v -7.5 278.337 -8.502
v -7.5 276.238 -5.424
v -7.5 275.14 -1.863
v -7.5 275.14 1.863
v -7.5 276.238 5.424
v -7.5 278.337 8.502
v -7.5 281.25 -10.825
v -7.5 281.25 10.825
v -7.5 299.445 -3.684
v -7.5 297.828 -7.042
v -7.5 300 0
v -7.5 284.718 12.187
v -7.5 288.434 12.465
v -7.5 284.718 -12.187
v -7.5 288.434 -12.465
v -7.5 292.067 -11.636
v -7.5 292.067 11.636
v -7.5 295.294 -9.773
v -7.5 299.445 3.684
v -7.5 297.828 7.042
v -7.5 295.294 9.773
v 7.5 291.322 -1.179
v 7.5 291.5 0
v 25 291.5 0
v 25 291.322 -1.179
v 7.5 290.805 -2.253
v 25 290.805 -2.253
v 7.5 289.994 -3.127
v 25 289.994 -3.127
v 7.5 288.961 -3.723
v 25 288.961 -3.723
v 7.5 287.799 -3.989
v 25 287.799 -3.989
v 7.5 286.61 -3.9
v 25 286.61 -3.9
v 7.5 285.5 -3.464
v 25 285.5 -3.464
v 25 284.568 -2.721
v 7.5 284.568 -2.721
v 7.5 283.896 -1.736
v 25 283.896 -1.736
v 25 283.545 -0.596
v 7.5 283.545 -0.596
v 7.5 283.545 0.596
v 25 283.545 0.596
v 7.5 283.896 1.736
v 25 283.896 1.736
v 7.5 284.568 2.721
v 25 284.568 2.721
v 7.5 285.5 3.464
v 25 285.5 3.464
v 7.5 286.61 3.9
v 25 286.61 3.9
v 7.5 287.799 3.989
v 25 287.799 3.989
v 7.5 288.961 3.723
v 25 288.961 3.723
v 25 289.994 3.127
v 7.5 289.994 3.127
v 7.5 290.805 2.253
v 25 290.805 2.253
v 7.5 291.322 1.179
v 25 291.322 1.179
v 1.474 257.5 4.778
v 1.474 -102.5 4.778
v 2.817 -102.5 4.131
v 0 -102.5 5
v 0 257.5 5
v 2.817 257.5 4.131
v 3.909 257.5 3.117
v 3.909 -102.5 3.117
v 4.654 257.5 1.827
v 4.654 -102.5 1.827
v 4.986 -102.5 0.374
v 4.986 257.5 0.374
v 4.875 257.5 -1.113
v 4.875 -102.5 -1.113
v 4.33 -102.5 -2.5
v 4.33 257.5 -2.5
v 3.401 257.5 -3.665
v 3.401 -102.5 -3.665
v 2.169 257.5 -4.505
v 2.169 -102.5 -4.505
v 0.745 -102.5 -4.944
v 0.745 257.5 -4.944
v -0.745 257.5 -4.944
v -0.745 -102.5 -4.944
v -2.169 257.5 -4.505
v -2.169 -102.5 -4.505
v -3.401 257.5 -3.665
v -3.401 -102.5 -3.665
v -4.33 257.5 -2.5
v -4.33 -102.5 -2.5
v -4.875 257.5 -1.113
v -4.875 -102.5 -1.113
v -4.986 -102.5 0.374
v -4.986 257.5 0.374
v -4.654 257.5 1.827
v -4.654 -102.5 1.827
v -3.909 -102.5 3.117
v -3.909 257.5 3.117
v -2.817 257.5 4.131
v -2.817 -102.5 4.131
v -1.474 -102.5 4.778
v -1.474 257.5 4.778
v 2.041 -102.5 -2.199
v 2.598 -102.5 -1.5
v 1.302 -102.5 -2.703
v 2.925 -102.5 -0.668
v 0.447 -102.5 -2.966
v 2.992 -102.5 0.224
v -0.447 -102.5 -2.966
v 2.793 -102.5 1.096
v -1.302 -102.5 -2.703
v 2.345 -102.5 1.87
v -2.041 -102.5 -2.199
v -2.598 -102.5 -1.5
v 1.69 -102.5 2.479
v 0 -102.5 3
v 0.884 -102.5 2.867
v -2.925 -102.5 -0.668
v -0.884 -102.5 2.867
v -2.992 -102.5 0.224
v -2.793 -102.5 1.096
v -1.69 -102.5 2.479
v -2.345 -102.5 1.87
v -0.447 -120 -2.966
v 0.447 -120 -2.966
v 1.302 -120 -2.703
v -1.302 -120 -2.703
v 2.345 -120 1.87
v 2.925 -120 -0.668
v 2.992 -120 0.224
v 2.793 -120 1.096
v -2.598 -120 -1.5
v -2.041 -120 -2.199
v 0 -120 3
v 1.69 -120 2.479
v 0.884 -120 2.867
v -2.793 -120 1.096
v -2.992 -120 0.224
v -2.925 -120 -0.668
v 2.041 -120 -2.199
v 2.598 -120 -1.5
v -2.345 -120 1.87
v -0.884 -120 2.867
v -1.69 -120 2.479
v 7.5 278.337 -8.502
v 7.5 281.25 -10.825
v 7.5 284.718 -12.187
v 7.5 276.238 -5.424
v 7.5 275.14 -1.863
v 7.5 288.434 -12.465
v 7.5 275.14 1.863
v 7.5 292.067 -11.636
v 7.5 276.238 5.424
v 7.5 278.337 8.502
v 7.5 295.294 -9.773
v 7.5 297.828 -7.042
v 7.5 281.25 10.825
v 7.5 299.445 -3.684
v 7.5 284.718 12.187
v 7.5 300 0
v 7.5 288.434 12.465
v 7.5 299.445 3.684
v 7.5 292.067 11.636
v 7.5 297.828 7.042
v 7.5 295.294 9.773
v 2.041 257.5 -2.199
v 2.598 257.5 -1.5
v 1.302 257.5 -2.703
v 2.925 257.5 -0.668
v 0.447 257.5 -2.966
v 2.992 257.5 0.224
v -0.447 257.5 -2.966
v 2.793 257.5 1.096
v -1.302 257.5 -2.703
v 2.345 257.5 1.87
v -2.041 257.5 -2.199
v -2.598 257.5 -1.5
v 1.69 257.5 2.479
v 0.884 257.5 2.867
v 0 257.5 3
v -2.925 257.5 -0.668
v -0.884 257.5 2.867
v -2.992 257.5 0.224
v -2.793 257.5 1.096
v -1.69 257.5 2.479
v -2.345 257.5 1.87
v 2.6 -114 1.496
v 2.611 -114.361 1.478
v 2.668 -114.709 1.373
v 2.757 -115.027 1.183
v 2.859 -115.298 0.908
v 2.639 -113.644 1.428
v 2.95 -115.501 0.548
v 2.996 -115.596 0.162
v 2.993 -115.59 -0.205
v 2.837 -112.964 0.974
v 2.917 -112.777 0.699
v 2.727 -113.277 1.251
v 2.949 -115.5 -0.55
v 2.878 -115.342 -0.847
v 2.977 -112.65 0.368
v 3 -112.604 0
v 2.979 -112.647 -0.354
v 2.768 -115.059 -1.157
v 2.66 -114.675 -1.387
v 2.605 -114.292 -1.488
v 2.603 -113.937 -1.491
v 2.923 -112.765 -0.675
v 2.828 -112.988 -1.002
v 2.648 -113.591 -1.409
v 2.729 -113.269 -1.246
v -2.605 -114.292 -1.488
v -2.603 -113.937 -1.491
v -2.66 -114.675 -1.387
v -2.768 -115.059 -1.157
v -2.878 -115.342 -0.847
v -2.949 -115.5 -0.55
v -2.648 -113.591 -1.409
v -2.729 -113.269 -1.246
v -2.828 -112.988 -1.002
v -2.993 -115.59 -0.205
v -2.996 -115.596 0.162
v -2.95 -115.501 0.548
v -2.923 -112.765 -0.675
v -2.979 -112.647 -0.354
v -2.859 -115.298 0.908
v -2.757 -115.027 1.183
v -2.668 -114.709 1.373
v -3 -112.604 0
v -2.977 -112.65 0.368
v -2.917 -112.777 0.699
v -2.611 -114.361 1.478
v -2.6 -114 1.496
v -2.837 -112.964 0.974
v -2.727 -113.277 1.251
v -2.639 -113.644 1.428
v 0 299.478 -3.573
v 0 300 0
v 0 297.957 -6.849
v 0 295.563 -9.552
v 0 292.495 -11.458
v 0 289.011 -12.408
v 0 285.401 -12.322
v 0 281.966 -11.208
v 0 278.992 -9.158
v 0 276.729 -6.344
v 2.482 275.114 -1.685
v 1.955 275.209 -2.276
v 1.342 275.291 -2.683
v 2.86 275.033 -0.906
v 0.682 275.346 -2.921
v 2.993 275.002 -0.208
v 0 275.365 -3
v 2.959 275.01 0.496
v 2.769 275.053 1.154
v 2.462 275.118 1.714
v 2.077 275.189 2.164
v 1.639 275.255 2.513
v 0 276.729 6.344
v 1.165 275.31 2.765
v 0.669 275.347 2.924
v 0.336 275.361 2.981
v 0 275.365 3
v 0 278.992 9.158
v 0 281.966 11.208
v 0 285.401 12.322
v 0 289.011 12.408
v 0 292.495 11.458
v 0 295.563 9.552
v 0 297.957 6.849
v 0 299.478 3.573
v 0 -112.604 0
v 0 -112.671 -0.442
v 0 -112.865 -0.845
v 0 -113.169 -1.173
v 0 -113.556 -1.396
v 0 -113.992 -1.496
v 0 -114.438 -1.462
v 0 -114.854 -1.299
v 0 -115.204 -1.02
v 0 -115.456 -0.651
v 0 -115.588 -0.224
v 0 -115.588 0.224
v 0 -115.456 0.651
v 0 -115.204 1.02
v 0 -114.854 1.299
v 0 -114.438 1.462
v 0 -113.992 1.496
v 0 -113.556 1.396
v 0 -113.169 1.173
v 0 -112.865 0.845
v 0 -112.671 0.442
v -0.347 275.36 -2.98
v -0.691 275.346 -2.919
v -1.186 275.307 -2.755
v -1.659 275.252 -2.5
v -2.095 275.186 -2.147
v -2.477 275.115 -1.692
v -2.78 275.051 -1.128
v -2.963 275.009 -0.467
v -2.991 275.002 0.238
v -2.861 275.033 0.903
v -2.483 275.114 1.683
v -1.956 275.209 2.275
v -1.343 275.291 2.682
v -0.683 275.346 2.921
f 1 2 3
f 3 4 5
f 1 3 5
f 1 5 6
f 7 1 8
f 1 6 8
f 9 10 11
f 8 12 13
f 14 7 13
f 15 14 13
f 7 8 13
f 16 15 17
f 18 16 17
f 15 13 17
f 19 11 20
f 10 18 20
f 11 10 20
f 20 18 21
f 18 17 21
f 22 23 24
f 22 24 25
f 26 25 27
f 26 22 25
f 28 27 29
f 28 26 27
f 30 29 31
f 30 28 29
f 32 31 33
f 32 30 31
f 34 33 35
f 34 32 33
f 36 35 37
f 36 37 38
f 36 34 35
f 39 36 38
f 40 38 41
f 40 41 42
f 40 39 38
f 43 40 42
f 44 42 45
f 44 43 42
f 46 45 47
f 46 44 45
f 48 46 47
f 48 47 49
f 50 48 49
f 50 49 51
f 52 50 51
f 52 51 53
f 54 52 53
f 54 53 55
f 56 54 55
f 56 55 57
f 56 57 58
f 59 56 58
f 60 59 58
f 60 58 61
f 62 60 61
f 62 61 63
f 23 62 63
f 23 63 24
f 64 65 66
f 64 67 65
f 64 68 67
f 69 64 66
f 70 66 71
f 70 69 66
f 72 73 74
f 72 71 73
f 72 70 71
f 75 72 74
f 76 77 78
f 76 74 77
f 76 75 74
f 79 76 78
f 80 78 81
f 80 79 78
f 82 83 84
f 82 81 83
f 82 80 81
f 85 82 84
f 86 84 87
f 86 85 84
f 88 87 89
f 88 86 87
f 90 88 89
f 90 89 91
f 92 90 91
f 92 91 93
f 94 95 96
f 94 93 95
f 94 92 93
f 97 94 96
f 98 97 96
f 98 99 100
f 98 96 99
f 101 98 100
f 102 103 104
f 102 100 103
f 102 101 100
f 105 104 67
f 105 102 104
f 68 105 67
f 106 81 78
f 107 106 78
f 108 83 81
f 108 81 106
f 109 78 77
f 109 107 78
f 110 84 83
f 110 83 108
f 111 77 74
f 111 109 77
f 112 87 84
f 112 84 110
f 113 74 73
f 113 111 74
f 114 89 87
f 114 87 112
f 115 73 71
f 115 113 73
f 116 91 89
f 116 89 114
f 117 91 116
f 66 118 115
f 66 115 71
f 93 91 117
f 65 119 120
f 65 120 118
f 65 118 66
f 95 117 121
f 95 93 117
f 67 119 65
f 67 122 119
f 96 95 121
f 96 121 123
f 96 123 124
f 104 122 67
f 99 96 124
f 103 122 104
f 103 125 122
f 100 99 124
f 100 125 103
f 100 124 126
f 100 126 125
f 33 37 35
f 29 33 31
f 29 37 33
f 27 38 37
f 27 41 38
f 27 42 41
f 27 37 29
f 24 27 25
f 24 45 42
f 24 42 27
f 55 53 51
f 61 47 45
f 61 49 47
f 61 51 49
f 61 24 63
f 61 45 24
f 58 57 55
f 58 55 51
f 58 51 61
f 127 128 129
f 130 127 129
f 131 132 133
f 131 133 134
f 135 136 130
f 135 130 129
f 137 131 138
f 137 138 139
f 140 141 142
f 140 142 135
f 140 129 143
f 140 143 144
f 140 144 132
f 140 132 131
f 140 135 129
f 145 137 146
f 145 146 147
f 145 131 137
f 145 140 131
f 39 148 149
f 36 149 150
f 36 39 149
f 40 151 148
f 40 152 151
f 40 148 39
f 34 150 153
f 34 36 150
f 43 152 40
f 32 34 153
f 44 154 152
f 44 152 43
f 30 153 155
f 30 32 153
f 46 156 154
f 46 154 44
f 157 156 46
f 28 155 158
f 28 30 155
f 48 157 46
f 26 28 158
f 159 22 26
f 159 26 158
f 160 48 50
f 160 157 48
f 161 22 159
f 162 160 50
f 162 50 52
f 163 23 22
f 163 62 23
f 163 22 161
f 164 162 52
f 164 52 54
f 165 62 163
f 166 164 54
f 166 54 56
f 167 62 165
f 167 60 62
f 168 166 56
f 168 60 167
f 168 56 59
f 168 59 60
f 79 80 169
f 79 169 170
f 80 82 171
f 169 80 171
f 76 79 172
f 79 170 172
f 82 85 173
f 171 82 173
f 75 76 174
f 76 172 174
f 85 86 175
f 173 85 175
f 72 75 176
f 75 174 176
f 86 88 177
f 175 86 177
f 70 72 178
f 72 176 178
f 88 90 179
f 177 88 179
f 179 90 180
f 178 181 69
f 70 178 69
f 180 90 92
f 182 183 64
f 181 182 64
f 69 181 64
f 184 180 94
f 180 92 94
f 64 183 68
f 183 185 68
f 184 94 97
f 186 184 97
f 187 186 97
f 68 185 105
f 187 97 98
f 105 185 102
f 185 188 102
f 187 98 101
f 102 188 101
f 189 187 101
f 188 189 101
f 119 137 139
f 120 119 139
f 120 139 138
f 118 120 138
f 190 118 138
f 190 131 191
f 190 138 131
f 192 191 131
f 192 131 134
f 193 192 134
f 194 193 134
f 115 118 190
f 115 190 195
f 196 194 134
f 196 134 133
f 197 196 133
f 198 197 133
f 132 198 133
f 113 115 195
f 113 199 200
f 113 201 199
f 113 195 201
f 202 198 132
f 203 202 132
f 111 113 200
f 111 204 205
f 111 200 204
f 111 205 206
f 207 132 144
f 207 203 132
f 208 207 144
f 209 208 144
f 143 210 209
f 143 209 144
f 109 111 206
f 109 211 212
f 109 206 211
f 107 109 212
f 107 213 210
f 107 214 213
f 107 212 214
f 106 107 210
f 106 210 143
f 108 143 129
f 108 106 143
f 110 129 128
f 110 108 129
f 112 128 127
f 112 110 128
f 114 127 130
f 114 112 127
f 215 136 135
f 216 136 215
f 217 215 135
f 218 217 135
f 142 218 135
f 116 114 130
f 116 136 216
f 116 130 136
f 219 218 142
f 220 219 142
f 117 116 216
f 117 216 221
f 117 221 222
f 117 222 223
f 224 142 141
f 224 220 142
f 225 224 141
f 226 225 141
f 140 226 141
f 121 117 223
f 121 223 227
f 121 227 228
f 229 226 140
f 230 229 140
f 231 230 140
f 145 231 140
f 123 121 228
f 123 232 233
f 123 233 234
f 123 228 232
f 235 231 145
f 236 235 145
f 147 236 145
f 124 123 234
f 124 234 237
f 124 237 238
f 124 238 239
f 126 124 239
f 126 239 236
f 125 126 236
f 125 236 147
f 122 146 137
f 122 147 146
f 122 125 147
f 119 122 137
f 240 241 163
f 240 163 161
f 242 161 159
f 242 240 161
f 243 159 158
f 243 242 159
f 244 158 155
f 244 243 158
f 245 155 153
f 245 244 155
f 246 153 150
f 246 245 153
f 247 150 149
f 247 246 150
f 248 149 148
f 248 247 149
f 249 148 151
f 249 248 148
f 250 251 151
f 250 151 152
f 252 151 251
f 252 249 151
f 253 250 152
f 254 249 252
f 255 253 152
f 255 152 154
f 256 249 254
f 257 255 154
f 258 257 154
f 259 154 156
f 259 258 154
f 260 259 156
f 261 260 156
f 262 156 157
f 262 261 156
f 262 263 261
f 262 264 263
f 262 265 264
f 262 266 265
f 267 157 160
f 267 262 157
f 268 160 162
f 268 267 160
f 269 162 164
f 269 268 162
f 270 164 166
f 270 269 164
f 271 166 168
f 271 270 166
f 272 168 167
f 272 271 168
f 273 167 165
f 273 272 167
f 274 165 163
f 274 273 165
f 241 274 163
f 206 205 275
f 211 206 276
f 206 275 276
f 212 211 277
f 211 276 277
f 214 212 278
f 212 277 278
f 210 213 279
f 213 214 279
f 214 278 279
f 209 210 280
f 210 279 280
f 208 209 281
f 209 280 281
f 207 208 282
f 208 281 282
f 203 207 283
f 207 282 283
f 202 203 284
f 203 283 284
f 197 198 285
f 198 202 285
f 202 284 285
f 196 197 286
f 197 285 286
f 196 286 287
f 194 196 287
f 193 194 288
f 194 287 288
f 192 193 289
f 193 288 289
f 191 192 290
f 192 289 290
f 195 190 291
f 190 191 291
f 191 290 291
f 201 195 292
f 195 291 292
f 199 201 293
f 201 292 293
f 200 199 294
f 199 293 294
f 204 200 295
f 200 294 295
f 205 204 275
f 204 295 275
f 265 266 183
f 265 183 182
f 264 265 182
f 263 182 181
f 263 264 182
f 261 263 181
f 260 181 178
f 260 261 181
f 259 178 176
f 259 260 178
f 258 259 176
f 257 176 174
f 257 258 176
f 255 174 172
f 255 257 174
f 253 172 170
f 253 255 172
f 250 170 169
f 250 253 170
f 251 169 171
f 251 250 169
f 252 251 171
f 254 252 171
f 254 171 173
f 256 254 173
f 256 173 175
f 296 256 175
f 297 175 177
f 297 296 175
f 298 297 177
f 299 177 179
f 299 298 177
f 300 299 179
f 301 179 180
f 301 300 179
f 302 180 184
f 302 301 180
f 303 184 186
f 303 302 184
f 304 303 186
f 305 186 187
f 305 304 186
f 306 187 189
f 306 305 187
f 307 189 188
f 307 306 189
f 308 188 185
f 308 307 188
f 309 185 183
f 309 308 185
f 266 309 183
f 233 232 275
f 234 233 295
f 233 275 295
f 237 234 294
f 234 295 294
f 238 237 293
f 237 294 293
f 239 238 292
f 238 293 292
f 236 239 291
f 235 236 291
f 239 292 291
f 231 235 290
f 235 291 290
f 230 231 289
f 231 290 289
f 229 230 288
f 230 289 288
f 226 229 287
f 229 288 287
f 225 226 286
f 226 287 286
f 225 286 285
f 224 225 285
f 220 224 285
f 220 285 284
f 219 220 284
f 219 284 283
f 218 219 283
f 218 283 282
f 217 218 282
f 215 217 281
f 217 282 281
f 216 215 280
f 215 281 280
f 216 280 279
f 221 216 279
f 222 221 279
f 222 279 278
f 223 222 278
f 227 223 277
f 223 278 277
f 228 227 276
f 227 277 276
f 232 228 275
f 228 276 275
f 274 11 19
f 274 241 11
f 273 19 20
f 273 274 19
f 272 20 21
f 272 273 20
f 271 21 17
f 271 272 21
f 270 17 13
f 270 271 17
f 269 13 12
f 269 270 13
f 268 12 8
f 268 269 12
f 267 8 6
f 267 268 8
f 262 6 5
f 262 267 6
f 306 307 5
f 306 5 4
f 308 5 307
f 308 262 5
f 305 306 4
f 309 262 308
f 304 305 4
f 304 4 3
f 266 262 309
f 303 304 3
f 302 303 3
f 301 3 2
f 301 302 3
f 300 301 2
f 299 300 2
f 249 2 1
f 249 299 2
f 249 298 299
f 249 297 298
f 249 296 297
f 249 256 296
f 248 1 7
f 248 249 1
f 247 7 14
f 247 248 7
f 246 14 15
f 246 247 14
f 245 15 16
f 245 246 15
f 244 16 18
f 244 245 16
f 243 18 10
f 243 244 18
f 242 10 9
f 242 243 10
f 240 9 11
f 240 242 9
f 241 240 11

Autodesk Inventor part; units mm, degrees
ref_plane "YZ Plane" through (0, 0, 0) normal (1, 0, 0) x (0, 1, 0)
ref_plane "XZ Plane" through (0, 0, 0) normal (0, 1, 0) x (-1, 0, 0)
ref_plane "XY Plane" through (0, 0, 0) normal (0, 0, 1) x (1, 0, 0)
sketch "Sketch1" plane through (0, 0, 0) normal (1, 0, 0) x (0, 1, 0)
  line L0 (300, 0) -> (-300, 0)
  circle A0 centre (287.5, 0) radius 12.5
  circle A1 centre (287.5, 0) radius 4
  line L1 (287.5, 0) -> (-120, 0)
  line L2 (-120, 0) -> (-120, 3)
  line L3 (-120, 3) -> (287.5, 3)
  line L4 (287.5, 3) -> (287.5, 0)
  line L5 (257.5, 0) -> (-102.5, 0)
  line L6 (-102.5, 0) -> (-102.5, 5)
  line L7 (-102.5, 5) -> (257.5, 5)
  line L8 (257.5, 5) -> (257.5, 0)
  point P0 (0, 0)
  point P1 (-120, 0)
  point P2 (283.5, 0)
  point P3 (284.8542, 3)
  point P4 (-102.5, 0)
  point P5 (257.5, 0)
  dimension "d0" = 600
  dimension "d1" = 25
  dimension "d2" = 12.5
  dimension "d3" = 8
  dimension "d4" = 3
  dimension "d12" = 360
  dimension "d13" = 5
  dimension "d16" = 30
revolve "Revolution1" add sketch "Sketch1" angle 360 about axis through (0, 300, 0) along (0, -1, 0) picked at (277.9311, 1.2871) contours L3 A1 L0 A0 | A0 L0 L8 L3 | L8 L0 L6 L3 | L6 L0 L2 L3
extrude "Extrusion2" add sketch "Sketch1" along normal blind 25 contours A1 L0 | L0 L4 L3 A1 | L0 A1 L3 L4
extrude "Extrusion3" add sketch "Sketch1" along normal mid plane 15 contours A0 L0 A1 | L0 A1 L3 A0 | A1 L0 | L0 L4 L3 A1 | L3 A1 L0 A0 | L0 A1 L3 L4
revolve "Revolution2" add sketch "Sketch1" angle 360 about axis through (0, 287.5, 0) along (0, -1, 0) contours L8 L0 L6 L3 | L3 L6 L7 L8
sketch "Sketch2" plane through (0, 0, 0) normal (1, 0, 0) x (0, 1, 0)
  circle A0 centre (-114.1043, 0) radius 1.5
  point P0 (0, 0)
  dimension "d17" = 3
extrude "Extrusion4" cut sketch "Sketch2" along normal mid plane 15
properties part number "tierod"
